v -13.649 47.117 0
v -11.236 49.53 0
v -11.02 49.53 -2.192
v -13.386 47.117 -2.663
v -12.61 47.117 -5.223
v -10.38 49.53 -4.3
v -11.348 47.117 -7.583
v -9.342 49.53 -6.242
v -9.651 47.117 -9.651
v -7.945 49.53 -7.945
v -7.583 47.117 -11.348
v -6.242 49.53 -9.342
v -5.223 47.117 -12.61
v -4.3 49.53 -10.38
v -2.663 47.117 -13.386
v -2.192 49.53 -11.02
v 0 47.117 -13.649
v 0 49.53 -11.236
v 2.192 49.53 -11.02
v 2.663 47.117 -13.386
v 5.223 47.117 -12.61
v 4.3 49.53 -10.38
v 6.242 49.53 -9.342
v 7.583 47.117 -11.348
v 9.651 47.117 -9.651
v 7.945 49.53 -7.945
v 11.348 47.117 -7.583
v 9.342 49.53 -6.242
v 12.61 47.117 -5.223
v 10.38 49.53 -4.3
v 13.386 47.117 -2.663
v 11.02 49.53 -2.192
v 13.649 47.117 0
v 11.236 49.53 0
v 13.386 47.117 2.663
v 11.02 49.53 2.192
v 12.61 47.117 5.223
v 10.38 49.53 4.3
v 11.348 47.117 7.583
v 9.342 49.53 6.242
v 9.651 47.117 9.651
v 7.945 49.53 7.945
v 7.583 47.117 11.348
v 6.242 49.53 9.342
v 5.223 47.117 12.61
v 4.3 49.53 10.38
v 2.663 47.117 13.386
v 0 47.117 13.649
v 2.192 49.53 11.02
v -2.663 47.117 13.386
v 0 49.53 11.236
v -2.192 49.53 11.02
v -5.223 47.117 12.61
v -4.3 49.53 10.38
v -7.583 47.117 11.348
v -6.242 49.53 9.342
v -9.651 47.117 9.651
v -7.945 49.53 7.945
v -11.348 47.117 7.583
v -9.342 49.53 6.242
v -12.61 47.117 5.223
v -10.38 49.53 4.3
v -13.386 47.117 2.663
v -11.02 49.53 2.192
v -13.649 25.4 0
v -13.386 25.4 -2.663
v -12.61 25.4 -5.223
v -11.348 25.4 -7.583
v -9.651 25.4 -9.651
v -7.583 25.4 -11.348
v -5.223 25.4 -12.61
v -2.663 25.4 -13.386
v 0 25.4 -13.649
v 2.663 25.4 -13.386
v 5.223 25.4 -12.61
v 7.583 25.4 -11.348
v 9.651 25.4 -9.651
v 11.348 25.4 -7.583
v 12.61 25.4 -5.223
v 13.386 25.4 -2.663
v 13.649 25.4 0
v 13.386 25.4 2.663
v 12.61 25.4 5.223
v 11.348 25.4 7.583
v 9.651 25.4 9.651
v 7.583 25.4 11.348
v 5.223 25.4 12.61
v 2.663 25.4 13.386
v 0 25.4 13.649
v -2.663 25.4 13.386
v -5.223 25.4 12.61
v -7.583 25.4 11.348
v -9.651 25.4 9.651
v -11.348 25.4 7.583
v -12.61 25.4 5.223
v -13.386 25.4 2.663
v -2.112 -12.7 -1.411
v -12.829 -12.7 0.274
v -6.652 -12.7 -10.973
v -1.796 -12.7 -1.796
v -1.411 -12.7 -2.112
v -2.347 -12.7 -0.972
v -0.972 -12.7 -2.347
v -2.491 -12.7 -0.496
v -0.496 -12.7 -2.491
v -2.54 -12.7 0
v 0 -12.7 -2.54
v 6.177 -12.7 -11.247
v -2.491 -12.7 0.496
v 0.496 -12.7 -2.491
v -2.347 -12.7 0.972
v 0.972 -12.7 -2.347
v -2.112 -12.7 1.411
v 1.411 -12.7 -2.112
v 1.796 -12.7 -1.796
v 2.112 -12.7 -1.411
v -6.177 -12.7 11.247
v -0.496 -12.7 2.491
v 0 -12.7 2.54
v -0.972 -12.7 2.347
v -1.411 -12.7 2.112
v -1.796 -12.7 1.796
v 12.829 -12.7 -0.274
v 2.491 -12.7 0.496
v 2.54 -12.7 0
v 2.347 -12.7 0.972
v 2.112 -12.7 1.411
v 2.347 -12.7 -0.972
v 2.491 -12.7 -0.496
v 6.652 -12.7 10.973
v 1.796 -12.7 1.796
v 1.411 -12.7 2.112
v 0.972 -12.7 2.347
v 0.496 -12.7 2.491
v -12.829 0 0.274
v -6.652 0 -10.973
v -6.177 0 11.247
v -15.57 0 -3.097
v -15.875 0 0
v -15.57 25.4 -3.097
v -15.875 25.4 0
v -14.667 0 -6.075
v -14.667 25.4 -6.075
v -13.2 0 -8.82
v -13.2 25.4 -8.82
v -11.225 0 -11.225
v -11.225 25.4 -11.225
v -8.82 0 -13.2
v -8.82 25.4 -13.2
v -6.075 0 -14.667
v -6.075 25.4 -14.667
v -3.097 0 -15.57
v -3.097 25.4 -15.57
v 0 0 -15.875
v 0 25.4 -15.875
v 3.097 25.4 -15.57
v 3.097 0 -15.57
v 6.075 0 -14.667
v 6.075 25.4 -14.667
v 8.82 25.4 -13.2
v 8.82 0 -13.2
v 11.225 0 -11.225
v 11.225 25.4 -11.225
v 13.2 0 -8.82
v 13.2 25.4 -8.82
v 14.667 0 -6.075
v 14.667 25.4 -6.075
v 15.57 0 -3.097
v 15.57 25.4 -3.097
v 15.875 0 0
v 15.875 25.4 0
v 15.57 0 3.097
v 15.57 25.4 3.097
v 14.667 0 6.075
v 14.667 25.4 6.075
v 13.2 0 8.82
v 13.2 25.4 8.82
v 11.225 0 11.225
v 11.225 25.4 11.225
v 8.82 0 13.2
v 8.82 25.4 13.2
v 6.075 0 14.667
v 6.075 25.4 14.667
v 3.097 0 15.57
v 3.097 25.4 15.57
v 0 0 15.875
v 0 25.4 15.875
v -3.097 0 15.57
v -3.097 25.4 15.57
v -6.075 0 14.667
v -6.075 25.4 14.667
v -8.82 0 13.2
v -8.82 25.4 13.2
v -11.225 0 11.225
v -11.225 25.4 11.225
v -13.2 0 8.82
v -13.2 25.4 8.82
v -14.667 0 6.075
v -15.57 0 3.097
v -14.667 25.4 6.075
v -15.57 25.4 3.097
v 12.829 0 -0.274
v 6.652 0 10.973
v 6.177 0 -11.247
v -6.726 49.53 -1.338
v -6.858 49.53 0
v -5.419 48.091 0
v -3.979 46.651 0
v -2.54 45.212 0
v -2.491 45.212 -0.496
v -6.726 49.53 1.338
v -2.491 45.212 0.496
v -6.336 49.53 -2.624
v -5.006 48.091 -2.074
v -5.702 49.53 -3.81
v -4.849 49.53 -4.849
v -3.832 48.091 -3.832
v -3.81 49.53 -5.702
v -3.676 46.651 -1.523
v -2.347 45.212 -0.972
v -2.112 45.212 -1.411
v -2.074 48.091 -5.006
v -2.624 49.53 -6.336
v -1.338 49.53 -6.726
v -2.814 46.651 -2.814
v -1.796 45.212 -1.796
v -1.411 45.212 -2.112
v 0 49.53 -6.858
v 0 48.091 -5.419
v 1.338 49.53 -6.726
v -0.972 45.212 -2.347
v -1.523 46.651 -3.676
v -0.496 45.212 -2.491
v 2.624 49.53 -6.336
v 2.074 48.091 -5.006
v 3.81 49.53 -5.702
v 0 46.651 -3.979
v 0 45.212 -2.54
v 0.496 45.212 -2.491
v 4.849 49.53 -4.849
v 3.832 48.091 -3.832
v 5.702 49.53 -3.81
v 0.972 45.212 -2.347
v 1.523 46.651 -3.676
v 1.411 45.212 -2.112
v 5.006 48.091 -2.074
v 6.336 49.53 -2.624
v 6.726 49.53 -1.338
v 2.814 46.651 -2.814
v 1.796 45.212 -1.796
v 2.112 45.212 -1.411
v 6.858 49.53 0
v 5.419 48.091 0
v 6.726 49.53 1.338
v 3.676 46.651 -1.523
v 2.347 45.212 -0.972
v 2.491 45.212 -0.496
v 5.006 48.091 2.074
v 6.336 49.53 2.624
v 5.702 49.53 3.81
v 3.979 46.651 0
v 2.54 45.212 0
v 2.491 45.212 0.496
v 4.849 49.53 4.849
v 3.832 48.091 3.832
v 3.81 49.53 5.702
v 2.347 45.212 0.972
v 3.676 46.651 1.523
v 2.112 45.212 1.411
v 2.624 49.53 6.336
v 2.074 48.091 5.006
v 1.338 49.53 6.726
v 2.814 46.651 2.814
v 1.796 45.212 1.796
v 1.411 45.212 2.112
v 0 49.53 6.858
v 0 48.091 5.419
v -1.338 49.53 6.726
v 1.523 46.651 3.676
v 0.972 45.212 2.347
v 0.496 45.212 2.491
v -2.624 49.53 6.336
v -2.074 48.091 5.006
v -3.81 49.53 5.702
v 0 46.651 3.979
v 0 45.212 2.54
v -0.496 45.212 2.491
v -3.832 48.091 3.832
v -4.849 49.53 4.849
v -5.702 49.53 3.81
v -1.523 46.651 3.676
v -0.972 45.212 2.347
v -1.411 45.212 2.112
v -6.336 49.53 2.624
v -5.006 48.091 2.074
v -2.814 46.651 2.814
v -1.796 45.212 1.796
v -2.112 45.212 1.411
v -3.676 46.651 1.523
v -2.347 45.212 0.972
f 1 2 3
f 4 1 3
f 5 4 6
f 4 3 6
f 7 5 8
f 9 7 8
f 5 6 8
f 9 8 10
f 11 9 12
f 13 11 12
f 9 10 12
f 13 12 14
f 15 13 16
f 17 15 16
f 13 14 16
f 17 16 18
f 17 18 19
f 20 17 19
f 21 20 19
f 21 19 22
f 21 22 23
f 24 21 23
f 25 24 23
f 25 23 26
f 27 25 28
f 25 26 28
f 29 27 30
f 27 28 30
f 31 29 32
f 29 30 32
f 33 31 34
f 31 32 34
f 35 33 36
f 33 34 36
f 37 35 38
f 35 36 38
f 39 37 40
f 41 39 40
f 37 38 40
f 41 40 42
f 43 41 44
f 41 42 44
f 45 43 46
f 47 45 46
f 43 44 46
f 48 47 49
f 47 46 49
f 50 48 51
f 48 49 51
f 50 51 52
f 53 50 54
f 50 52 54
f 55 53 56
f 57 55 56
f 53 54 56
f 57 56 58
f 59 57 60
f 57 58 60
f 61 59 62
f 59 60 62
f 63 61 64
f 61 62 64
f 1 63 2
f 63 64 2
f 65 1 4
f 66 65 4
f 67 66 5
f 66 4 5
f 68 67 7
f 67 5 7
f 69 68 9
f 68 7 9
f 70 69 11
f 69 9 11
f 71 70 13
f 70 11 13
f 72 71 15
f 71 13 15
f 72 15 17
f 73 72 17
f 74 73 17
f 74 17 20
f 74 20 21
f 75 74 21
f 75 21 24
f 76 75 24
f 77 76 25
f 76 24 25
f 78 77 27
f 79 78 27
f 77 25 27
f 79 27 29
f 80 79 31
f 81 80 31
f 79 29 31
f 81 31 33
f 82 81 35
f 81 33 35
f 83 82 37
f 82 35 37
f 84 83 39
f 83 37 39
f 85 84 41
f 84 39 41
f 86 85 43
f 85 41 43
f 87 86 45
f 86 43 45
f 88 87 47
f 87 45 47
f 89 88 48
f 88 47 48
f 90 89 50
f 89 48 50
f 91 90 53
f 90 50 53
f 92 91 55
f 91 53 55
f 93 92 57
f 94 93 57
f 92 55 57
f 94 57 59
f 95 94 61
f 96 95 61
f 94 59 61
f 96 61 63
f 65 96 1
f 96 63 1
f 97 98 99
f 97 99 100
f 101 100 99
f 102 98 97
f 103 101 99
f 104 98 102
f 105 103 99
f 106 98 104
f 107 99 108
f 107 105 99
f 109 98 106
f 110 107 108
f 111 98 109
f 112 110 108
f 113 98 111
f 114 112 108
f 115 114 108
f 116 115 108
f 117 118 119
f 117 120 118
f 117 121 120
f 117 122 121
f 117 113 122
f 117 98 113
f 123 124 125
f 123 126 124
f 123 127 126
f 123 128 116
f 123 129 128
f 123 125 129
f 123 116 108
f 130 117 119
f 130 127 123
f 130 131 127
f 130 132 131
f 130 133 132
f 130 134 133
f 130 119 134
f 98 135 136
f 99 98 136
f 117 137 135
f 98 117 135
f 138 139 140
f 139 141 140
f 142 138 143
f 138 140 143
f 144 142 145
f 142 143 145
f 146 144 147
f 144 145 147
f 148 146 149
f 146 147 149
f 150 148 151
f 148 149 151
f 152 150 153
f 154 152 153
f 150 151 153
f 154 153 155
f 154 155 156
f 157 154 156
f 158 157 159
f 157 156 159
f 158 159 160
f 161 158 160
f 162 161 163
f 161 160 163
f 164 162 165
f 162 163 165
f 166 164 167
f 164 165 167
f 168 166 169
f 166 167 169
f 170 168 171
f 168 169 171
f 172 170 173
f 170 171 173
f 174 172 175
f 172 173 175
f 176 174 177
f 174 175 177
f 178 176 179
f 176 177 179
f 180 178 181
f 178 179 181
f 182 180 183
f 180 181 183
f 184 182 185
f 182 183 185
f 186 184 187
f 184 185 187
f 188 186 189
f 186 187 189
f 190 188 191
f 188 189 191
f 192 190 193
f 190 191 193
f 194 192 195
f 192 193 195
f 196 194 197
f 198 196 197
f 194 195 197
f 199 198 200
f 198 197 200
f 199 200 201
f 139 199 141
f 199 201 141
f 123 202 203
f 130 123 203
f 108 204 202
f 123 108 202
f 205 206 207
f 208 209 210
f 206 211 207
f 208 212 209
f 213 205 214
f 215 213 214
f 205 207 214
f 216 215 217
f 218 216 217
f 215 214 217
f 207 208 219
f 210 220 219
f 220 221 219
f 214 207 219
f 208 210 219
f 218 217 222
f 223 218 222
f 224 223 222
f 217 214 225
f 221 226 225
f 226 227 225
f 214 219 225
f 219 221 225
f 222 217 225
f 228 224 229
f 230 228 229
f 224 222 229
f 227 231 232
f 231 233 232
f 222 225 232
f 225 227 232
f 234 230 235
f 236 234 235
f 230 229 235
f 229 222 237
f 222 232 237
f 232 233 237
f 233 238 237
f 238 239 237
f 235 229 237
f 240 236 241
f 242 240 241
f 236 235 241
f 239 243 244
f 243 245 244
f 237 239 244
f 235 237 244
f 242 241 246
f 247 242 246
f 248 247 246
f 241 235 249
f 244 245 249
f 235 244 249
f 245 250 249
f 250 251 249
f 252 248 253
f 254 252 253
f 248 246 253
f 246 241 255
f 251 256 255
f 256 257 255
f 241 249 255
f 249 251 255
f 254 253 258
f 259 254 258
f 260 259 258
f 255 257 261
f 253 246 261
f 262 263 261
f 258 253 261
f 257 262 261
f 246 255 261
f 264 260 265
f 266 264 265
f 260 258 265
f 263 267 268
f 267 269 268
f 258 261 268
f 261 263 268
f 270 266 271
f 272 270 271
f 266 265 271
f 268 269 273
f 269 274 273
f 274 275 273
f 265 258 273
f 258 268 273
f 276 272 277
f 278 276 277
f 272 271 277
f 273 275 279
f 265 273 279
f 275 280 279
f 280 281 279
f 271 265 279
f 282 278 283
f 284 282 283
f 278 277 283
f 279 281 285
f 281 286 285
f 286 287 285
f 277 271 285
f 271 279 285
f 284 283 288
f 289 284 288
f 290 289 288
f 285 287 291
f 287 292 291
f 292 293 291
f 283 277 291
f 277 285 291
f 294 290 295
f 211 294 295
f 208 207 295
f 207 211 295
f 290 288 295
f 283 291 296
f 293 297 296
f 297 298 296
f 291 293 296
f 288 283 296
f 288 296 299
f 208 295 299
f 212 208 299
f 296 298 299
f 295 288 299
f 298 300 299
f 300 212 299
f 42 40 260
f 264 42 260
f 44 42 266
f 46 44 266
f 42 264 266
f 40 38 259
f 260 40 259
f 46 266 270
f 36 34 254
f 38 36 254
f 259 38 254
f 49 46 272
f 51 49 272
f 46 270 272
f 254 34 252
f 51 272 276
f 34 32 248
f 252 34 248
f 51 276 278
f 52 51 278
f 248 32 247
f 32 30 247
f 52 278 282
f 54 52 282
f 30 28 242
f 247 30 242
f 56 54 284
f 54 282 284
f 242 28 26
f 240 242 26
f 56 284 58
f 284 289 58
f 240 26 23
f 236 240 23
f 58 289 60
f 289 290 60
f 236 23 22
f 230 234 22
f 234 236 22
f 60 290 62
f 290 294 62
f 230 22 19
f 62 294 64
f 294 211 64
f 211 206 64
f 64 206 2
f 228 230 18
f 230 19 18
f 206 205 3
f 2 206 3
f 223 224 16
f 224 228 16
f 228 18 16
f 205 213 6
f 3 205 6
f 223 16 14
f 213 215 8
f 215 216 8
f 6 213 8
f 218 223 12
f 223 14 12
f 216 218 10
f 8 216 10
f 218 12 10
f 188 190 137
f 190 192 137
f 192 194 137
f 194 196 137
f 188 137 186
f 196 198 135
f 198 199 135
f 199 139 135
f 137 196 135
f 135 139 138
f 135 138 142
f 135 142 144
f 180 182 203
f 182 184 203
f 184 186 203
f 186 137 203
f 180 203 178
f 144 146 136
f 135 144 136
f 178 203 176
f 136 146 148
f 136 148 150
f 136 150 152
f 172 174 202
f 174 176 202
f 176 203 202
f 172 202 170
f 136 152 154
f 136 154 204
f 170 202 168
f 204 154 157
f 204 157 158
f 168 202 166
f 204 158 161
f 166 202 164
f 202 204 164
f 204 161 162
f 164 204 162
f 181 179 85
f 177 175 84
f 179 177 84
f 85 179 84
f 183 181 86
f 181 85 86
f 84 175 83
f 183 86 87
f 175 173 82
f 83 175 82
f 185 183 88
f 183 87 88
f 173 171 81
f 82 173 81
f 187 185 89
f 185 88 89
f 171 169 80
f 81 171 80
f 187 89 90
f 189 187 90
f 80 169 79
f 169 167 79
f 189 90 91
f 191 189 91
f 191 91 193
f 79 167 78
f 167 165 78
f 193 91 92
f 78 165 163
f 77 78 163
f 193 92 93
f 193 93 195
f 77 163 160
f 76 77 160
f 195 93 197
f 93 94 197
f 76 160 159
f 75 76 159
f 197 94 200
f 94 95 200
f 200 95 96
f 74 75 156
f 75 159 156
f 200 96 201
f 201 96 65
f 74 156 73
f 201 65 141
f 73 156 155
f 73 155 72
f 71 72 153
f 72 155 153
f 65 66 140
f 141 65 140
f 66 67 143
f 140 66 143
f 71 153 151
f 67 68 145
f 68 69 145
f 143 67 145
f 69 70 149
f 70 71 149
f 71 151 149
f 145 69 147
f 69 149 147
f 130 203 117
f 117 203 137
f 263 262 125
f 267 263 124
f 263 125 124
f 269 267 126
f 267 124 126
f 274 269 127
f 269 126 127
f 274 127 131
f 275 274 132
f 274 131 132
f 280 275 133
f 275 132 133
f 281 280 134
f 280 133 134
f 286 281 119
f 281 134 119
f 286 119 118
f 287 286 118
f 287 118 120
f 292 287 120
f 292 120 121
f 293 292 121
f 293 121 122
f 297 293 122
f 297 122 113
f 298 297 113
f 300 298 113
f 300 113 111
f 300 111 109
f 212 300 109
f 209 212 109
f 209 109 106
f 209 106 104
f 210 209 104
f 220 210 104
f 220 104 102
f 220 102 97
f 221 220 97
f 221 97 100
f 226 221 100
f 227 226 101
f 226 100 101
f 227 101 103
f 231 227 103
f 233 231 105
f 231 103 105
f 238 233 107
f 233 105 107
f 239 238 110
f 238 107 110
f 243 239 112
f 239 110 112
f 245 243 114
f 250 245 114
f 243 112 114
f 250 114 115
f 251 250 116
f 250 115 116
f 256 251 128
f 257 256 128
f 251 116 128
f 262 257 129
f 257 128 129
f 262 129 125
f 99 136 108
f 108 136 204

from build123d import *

# Parameters (mm, degrees)
BOSS_EXTRUDE2_DEPTH = 12.7
CHAMFER2_SIZE       = 2.413
SKETCH13_R          = 2.54
CUT_EXTRUDE1_DEPTH  = 63.23


with BuildPart() as part:
    # Sketch1 → Revolve1 (revolve)
    with BuildSketch(Plane.XY):
        Polygon((-15.875, 25.4), (-13.64869, 25.4), (-13.64869, 49.53), (-6.858, 49.53), (0, 42.672), (0, 0), (-15.875, 0), align=None)
    revolve(axis=Axis((0, 110.151211274, 0), (0, -1, 0)))

    # Sketch12 → Boss-Extrude2 (add)
    with BuildSketch(Plane.XZ):
        Polygon((-12.828682674, 0.274060562), (-6.651684746, -10.972934812), (6.176997928, -11.246995373), (12.828682674, -0.274060562), (6.651684746, 10.972934812), (-6.176997928, 11.246995373), align=None)
    extrude(amount=BOSS_EXTRUDE2_DEPTH)

    # Chamfer2
    chamfer2_edges = [part.edges().sort_by_distance(p)[0] for p in [
        (13.64869, 49.53, 0),
    ]]
    chamfer(chamfer2_edges, length=CHAMFER2_SIZE)

    # Sketch13 → Cut-Extrude1 (cut, through all)
    with BuildSketch(Plane.XZ.offset(12.7)):
        Circle(SKETCH13_R)
    extrude(amount=-CUT_EXTRUDE1_DEPTH, mode=Mode.SUBTRACT)


solid = part.part
